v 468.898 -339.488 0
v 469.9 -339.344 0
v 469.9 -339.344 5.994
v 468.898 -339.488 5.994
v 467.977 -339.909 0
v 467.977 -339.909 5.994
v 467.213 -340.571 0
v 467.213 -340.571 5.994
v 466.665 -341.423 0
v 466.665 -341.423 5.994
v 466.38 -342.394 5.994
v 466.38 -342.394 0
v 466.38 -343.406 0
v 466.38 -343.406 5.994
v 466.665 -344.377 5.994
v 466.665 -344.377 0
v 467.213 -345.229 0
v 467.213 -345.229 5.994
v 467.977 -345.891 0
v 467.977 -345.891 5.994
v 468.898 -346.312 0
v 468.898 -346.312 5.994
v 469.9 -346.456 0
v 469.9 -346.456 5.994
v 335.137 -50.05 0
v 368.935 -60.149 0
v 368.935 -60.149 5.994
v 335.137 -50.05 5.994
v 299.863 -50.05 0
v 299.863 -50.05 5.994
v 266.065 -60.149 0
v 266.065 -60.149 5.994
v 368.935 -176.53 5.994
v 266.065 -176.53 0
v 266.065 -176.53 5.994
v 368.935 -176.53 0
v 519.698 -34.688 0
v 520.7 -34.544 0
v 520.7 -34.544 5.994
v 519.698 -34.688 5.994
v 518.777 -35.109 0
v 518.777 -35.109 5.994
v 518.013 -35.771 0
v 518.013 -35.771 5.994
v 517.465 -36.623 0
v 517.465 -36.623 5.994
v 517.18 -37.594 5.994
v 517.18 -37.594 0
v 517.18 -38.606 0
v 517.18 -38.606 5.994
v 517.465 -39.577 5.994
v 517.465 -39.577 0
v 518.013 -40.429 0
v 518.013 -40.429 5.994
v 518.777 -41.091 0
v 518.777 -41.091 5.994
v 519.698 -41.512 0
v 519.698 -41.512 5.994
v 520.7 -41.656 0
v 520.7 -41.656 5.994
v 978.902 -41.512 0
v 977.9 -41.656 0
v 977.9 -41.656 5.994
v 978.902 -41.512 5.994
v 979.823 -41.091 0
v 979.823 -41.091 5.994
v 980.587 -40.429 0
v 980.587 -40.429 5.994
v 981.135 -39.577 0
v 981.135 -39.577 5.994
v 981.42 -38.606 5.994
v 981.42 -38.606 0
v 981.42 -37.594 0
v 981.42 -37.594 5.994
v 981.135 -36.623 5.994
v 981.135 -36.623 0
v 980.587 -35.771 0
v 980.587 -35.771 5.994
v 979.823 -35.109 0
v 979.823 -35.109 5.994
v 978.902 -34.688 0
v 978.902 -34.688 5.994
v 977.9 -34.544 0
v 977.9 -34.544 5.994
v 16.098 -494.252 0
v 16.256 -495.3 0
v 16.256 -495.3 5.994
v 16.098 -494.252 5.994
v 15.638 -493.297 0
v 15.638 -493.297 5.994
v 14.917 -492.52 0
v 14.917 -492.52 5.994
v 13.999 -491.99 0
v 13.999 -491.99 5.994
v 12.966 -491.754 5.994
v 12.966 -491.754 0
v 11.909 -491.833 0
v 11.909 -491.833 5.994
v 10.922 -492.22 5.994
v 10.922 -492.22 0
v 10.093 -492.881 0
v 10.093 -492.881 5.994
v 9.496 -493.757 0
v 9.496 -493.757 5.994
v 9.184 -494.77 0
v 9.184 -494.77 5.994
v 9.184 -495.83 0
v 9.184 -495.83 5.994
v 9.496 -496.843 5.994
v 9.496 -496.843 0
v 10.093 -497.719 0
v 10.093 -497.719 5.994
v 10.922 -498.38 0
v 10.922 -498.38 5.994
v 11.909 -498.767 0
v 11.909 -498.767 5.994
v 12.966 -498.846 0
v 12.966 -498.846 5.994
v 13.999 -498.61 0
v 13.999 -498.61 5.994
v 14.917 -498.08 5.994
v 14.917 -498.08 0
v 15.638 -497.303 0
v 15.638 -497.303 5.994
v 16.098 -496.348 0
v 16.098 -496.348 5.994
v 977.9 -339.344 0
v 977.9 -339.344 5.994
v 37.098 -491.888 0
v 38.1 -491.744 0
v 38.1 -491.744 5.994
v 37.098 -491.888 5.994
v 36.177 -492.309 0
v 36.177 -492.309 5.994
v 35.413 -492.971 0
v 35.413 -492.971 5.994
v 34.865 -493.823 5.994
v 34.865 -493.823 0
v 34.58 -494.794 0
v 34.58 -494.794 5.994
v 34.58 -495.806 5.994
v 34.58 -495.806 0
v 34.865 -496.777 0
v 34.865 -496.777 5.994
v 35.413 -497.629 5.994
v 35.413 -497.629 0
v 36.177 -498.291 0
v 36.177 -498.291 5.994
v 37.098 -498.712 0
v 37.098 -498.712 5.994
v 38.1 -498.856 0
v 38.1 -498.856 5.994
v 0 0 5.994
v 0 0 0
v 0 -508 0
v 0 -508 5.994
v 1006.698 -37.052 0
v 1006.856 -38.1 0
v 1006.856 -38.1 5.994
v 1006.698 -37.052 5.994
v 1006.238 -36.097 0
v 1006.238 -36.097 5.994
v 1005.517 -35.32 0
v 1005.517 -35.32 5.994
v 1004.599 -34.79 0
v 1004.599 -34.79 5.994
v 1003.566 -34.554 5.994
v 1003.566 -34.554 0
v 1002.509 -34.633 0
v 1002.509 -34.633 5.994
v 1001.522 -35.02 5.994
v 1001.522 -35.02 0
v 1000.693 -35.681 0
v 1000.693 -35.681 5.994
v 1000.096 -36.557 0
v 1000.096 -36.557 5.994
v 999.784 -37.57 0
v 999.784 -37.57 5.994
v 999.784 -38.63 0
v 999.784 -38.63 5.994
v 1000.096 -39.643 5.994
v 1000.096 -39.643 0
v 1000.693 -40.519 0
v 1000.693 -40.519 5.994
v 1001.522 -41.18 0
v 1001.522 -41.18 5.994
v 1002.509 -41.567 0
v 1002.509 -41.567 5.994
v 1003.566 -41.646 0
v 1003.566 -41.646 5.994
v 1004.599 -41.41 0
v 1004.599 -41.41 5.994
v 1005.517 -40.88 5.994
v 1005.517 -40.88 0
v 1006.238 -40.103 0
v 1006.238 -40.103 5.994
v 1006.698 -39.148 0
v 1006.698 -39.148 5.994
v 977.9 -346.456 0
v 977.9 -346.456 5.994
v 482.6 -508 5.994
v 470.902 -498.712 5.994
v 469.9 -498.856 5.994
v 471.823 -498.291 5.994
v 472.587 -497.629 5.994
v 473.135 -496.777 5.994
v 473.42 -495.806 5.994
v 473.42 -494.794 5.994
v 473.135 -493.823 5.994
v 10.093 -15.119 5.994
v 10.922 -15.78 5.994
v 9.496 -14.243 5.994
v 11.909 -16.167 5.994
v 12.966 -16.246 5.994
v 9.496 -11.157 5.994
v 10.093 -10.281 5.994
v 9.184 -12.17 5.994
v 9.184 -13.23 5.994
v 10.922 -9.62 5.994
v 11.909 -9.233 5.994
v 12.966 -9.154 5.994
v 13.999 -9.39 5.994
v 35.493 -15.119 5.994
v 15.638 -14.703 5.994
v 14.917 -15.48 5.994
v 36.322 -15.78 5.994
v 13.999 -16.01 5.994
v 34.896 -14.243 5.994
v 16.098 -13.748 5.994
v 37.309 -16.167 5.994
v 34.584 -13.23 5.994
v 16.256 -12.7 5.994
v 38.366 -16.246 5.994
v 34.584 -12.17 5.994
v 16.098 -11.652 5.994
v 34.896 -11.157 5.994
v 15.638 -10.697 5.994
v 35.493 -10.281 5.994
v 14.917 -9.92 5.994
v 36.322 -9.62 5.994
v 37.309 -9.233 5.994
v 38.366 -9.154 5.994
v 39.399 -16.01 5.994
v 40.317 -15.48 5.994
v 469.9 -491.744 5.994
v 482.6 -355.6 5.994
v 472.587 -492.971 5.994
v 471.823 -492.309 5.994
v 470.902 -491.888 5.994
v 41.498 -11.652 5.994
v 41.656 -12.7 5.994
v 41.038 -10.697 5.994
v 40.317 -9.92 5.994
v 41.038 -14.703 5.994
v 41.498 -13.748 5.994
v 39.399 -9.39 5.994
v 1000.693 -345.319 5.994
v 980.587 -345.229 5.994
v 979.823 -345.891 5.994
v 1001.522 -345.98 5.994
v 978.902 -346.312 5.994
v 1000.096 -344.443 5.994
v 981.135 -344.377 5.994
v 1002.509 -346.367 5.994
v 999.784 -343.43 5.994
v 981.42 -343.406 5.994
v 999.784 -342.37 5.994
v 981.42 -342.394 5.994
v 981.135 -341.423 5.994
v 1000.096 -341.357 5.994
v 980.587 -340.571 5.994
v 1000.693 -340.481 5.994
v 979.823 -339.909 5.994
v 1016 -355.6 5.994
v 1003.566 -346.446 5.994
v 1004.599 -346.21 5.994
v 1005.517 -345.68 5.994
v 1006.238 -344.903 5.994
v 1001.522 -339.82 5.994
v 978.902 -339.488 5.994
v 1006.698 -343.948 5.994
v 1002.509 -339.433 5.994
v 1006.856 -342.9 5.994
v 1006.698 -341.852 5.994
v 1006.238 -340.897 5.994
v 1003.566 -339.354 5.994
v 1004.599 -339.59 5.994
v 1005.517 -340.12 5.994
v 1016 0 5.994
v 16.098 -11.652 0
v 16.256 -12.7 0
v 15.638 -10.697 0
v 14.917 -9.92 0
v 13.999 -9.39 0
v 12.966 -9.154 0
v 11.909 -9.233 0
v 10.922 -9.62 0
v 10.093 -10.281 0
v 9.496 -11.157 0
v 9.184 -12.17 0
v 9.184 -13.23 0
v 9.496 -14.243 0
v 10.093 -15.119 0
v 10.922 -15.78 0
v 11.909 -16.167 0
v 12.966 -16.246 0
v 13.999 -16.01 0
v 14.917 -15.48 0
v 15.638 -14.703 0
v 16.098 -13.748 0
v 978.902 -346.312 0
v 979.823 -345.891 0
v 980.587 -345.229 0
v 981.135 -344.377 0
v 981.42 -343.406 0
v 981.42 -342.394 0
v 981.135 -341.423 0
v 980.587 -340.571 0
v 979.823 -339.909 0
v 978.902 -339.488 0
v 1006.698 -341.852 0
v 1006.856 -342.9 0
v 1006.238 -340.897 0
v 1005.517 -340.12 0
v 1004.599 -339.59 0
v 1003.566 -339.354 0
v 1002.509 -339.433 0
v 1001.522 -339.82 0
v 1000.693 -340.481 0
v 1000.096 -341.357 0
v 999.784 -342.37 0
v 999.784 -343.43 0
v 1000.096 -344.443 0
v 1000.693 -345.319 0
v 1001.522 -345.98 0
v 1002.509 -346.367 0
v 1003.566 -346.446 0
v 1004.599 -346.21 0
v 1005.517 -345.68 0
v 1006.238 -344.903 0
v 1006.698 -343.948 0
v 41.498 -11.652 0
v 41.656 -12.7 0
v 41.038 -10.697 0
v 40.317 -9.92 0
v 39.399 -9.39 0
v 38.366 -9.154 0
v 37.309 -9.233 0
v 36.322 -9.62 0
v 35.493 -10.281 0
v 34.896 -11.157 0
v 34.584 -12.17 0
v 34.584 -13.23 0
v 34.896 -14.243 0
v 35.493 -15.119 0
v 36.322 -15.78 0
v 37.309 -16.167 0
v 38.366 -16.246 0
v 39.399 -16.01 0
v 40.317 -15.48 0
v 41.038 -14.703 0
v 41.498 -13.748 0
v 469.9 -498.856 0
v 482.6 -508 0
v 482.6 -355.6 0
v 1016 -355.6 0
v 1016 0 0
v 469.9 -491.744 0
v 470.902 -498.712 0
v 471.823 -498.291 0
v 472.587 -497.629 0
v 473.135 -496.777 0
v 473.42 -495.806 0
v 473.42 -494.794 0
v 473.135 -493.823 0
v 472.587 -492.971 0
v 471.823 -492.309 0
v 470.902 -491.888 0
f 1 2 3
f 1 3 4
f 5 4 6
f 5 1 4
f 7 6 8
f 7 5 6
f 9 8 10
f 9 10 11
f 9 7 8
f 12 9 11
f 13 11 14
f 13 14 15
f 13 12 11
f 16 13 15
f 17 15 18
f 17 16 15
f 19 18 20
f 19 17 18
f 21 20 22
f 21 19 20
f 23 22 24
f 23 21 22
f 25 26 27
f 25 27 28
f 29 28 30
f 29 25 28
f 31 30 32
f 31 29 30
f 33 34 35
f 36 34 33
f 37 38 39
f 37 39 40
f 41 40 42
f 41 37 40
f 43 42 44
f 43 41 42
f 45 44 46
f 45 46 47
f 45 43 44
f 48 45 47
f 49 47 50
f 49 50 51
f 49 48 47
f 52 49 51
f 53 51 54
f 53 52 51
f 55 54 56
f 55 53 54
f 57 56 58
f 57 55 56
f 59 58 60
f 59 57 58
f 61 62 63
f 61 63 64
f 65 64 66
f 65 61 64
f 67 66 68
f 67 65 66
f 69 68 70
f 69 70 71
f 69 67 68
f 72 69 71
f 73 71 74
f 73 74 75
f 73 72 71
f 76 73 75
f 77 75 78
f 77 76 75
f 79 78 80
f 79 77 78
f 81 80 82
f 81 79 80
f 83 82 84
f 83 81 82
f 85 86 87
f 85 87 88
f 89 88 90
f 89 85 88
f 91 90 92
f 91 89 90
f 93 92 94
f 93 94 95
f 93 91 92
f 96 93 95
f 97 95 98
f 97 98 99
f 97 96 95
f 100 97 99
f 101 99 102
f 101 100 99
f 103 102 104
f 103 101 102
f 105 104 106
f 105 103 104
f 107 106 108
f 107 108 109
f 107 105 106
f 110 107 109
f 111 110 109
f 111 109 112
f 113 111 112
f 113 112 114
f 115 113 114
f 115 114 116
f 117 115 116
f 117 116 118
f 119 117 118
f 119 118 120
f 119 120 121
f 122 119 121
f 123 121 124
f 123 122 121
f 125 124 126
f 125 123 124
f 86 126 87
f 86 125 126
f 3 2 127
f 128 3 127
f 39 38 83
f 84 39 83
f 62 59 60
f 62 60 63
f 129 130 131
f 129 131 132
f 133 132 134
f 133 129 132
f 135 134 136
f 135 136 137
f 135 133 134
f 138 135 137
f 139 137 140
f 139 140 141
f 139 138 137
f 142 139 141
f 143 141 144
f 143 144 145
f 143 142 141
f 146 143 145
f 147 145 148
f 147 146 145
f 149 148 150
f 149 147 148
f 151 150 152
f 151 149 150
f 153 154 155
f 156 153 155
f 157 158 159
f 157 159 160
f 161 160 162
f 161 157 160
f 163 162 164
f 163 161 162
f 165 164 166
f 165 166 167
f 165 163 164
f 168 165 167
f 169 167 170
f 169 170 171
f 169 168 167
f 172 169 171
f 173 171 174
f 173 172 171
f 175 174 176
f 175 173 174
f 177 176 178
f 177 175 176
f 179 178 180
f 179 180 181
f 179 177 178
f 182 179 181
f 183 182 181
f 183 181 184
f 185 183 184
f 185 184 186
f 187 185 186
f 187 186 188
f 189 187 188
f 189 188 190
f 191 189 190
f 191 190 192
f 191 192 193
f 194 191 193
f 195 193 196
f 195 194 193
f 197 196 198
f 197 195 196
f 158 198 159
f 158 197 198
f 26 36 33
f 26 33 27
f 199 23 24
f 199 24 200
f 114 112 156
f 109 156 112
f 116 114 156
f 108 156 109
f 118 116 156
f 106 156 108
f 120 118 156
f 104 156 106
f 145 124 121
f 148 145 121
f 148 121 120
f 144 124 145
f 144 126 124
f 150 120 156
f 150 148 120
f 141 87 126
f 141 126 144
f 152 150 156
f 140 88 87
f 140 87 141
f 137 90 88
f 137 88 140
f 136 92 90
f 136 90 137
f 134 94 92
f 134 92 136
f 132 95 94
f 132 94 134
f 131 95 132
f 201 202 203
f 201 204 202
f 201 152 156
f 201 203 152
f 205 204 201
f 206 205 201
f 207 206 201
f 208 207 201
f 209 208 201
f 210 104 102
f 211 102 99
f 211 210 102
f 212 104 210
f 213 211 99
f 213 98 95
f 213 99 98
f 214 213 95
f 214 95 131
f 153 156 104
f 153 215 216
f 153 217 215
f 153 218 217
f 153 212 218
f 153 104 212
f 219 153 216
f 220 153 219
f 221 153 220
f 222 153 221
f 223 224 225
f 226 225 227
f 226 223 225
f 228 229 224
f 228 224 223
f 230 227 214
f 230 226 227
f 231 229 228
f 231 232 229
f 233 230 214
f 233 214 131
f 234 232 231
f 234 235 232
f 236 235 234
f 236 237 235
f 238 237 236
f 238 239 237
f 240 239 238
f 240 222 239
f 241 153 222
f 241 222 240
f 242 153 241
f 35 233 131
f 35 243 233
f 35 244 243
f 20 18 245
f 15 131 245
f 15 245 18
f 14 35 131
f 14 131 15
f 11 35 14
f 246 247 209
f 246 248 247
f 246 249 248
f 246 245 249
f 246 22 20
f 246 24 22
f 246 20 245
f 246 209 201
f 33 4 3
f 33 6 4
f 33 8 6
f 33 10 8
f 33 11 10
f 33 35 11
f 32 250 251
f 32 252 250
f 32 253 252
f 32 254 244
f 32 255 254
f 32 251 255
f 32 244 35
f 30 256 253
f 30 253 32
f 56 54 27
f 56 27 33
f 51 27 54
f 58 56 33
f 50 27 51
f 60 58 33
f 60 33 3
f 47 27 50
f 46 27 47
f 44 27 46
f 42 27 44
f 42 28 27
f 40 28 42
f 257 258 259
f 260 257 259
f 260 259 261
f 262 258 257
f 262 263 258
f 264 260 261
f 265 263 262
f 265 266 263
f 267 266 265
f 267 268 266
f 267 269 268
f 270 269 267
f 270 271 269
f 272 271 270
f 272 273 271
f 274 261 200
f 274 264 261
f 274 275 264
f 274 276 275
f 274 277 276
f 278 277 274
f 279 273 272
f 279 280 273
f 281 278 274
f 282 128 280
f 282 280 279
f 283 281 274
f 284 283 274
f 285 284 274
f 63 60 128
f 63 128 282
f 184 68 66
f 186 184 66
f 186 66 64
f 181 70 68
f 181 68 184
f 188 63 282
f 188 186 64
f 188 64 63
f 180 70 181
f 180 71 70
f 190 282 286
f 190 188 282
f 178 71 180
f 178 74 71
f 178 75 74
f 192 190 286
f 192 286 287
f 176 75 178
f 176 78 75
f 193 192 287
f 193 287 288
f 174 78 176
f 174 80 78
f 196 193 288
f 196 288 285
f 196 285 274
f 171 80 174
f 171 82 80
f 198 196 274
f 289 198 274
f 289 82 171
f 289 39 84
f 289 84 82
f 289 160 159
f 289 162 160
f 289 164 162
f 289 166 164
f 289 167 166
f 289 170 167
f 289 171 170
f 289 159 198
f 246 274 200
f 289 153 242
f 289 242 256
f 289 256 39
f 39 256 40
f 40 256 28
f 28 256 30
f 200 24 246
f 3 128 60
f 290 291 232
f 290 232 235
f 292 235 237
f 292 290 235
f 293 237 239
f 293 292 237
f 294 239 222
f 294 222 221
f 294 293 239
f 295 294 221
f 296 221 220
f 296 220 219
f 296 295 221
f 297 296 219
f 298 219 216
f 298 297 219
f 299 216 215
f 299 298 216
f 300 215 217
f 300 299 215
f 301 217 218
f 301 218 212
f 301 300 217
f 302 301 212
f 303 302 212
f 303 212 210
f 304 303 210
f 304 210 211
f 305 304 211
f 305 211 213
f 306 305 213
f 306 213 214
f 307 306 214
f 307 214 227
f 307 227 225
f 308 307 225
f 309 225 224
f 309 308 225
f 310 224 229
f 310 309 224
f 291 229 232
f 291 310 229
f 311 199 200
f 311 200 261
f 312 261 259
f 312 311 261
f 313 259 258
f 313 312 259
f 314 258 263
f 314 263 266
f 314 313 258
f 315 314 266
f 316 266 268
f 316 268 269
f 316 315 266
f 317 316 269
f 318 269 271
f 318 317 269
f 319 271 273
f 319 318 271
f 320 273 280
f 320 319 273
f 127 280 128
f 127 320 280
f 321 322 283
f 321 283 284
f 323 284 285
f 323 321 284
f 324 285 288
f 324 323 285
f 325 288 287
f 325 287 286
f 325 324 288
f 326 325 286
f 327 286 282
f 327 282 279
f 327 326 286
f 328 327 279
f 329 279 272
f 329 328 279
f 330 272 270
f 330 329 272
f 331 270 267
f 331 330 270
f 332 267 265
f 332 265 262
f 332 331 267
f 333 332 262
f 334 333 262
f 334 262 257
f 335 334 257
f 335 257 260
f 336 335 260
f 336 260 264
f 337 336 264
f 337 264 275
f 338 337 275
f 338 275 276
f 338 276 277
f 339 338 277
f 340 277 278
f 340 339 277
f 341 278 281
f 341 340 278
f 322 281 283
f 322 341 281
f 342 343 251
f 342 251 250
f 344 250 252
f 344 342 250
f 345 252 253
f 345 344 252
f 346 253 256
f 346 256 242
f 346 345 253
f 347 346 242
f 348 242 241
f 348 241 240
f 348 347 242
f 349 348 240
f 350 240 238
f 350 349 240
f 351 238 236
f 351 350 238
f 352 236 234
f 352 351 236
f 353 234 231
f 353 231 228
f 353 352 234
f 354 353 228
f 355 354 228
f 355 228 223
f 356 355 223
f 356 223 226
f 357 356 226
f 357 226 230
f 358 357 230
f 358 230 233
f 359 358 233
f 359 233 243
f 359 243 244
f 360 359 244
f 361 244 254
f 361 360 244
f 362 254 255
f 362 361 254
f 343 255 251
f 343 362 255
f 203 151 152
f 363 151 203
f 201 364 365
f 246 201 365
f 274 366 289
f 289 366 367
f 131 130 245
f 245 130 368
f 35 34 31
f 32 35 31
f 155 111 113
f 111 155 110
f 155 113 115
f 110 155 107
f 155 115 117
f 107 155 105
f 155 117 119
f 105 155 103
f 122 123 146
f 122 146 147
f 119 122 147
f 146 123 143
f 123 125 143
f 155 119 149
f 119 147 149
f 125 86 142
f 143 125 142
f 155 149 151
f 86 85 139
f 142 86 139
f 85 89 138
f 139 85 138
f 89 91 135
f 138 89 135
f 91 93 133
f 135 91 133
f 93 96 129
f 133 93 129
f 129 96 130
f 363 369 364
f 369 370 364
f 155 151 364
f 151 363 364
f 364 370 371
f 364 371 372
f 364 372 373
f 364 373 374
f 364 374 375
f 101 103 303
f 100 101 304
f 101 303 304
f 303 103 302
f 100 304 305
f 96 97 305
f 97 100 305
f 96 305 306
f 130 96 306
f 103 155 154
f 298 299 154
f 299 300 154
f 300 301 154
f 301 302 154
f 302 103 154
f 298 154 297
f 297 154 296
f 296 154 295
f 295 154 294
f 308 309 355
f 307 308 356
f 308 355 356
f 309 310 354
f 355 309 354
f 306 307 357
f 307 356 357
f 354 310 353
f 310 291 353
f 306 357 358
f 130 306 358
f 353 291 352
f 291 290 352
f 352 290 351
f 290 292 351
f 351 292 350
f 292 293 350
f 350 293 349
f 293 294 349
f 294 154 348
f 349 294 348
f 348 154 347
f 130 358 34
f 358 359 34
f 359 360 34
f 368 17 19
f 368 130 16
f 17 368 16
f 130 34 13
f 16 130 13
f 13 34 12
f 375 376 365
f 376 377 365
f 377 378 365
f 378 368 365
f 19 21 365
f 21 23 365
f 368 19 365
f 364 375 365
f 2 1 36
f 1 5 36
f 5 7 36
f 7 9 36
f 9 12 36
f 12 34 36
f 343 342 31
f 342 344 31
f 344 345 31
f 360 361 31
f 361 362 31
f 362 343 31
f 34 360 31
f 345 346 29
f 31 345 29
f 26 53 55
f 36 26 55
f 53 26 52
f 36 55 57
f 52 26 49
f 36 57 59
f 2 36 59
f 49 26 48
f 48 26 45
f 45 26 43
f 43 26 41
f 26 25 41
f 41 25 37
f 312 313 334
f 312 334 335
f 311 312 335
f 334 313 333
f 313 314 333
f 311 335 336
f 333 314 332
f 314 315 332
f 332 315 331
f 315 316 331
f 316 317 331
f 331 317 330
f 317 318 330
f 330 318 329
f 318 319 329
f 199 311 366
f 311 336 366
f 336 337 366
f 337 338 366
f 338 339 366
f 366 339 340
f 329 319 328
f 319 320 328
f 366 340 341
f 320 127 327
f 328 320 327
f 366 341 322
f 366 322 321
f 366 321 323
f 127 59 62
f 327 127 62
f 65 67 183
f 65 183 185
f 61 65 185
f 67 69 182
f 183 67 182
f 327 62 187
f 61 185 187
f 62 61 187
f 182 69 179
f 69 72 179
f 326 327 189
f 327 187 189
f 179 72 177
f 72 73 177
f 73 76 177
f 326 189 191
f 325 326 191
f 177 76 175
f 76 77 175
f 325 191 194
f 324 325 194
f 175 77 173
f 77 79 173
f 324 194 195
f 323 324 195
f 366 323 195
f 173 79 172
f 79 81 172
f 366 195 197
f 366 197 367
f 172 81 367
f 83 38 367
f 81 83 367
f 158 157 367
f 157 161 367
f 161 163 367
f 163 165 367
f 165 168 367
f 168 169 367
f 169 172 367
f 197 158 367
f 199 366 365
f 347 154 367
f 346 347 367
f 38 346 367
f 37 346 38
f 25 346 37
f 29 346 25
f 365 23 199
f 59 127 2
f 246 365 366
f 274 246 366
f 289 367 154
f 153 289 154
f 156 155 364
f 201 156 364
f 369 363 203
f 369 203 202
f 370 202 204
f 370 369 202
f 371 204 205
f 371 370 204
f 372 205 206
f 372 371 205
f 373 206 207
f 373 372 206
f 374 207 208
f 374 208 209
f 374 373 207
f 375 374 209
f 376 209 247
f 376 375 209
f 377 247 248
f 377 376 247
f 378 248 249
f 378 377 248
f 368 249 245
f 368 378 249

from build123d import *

# Parameters (mm, degrees)
SKETCH_R      = 3.556
EXTRUDE_DEPTH = 5.9944


with BuildPart() as part:
    # Sketch → Extrude (new body)
    with BuildSketch(Plane.XY):
        Polygon((0, -508), (482.6, -508), (482.6, -355.6), (1016, -355.6), (1016, 0), (0, 0), align=None)
        with Locations((12.7, -12.7)):
            Circle(SKETCH_R, mode=Mode.SUBTRACT)
        with Locations((38.1, -12.7)):
            Circle(SKETCH_R, mode=Mode.SUBTRACT)
        with Locations((1003.3, -38.1)):
            Circle(SKETCH_R, mode=Mode.SUBTRACT)
        with Locations((1003.3, -342.9)):
            Circle(SKETCH_R, mode=Mode.SUBTRACT)
        with Locations((12.7, -495.3)):
            Circle(SKETCH_R, mode=Mode.SUBTRACT)
        with BuildLine():
            Line((266.065, -176.53), (368.935, -176.53))
            Line((368.935, -176.53), (368.935, -60.148744))
            ThreePointArc((368.935, -60.148744), (317.5, -48.768), (266.065, -60.148744))
            Line((266.065, -176.53), (266.065, -60.148744))
        make_face(mode=Mode.SUBTRACT)
        with BuildLine():
            Line((469.9, -346.456), (977.9, -346.456))
            ThreePointArc((977.9, -346.456), (981.456, -342.9), (977.9, -339.344))
            Line((469.9, -339.344), (977.9, -339.344))
            ThreePointArc((469.9, -339.344), (466.344, -342.9), (469.9, -346.456))
        make_face(mode=Mode.SUBTRACT)
        with BuildLine():
            Line((520.7, -34.544), (977.9, -34.544))
            ThreePointArc((977.9, -41.656), (981.456, -38.1), (977.9, -34.544))
            Line((520.7, -41.656), (977.9, -41.656))
            ThreePointArc((520.7, -34.544), (517.144, -38.1), (520.7, -41.656))
        make_face(mode=Mode.SUBTRACT)
        with BuildLine():
            Line((38.1, -491.744), (469.9, -491.744))
            ThreePointArc((469.9, -498.856), (473.456, -495.3), (469.9, -491.744))
            Line((38.1, -498.856), (469.9, -498.856))
            ThreePointArc((38.1, -491.744), (34.544, -495.3), (38.1, -498.856))
        make_face(mode=Mode.SUBTRACT)
    extrude(amount=EXTRUDE_DEPTH)


solid = part.part
